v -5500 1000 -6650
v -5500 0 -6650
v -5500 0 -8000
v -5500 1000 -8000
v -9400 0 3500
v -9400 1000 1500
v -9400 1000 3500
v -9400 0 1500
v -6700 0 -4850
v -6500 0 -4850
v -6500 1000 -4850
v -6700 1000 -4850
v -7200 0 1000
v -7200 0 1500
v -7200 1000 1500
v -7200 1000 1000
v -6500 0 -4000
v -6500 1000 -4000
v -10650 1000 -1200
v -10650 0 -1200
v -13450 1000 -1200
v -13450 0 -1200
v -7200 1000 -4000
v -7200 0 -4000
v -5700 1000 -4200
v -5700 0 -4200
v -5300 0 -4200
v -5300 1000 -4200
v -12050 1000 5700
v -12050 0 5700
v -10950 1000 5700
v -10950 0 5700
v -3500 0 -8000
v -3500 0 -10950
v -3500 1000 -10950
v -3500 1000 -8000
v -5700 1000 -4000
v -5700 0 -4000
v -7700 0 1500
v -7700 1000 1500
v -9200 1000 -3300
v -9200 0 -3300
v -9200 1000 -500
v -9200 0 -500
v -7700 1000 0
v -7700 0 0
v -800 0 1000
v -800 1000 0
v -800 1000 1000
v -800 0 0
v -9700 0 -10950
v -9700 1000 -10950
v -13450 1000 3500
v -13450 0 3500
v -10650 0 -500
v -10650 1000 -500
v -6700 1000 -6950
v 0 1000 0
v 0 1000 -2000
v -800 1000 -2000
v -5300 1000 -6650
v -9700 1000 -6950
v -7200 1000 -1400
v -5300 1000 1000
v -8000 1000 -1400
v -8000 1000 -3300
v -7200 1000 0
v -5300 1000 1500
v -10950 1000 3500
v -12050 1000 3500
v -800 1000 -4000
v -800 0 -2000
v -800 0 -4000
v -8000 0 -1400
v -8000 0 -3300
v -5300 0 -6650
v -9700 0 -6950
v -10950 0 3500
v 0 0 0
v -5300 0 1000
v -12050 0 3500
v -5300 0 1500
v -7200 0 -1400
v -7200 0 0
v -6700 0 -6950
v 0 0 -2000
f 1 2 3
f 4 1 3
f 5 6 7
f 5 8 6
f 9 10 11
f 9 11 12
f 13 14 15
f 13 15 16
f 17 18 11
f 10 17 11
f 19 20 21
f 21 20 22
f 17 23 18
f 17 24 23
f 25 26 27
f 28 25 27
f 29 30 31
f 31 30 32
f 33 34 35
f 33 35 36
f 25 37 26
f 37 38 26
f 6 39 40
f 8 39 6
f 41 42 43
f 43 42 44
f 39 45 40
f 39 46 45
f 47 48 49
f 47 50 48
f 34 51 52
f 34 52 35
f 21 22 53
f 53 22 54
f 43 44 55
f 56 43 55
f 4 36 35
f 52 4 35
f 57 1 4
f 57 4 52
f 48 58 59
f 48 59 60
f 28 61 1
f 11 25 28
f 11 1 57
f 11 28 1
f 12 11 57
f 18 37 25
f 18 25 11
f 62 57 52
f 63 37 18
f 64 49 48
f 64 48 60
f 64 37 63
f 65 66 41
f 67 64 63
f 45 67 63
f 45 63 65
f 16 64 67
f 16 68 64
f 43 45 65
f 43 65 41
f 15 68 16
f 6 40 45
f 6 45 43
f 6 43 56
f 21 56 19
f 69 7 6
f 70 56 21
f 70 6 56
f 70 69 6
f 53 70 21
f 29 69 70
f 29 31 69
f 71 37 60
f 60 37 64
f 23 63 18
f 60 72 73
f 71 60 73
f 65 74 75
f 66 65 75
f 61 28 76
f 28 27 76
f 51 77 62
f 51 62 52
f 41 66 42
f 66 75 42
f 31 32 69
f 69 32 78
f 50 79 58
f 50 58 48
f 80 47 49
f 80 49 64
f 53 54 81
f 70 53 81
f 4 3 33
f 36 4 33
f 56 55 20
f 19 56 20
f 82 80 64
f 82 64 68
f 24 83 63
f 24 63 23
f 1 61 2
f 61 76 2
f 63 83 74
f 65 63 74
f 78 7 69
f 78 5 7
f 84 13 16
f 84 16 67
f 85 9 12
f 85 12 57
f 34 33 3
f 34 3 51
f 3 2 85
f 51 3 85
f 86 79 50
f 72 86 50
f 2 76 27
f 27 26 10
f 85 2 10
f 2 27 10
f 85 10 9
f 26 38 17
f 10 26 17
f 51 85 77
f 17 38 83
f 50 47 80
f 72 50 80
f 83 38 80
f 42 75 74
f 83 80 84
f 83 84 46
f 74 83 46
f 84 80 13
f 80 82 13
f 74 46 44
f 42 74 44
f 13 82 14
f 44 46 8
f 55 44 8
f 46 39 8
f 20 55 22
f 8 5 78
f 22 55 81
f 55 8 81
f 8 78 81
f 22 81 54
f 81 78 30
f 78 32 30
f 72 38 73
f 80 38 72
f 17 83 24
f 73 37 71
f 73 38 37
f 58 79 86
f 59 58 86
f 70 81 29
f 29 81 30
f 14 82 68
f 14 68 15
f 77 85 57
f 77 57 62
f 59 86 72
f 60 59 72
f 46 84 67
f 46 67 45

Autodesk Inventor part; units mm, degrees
ref_plane "YZ Plane" through (0, 0, 0) normal (1, 0, 0) x (0, 1, 0)
ref_plane "XZ Plane" through (0, 0, 0) normal (0, 1, 0) x (-1, 0, 0)
ref_plane "XY Plane" through (0, 0, 0) normal (0, 0, 1) x (1, 0, 0)
sketch "Sketch1" plane through (0, 0, 0) normal (0, 1, 0) x (-1, 0, 0)
  line L0 (0, 0) -> (0, -2000)
  line L1 (0, 0) -> (800, 0)
  line L2 (800, 0) -> (800, 1000)
  line L3 (7200, 1000) -> (7200, 0)
  line L4 (7200, 0) -> (7200, -1400) construction
  line L5 (0, -2000) -> (800, -2000)
  line L6 (800, -2000) -> (800, -4000)
  line L7 (800, -4000) -> (7200, -4000) construction
  line L8 (7200, -1400) -> (7200, -4000)
  line L9 (7200, -4000) -> (6500, -4000)
  line L10 (6500, -4000) -> (5700, -4000) construction
  line L11 (5700, -4000) -> (800, -4000)
  line L12 (7200, 0) -> (7700, 0)
  line L13 (7700, 0) -> (7700, 1500)
  line L14 (7700, 1500) -> (9400, 1500)
  line L15 (9400, 1500) -> (9400, 3500)
  line L16 (9400, 3500) -> (10950, 3500)
  line L17 (10950, 3500) -> (12050, 3500) construction
  line L18 (7200, -1400) -> (8000, -1400)
  line L19 (8000, -1400) -> (8000, -3300)
  line L20 (8000, -3300) -> (9200, -3300)
  line L21 (9200, -3300) -> (9200, -500)
  line L22 (9200, -500) -> (10650, -500)
  line L23 (10650, -500) -> (10650, -1200)
  line L24 (10650, -1200) -> (13450, -1200)
  line L25 (13450, -1200) -> (13450, 3500)
  line L26 (13450, 3500) -> (12050, 3500)
  line L27 (12050, 3500) -> (12050, 5700)
  line L28 (12050, 5700) -> (10950, 5700)
  line L29 (10950, 5700) -> (10950, 3500)
  line L30 (6500, -4000) -> (6500, -4850)
  line L31 (6500, -4850) -> (6700, -4850)
  line L32 (6700, -4850) -> (6700, -6950)
  line L33 (6700, -6950) -> (9700, -6950)
  line L34 (9700, -6950) -> (9700, -10950)
  line L35 (5700, -4000) -> (5700, -4200)
  line L36 (5700, -4200) -> (5300, -4200)
  line L37 (5300, -4200) -> (5300, -6650)
  line L38 (5300, -6650) -> (5500, -6650)
  line L39 (5500, -6650) -> (5500, -8000)
  line L40 (5500, -8000) -> (3500, -8000)
  line L41 (9700, -10950) -> (3500, -10950)
  line L42 (3500, -10950) -> (3500, -8000)
  line L43 (800, 1000) -> (5300, 1000)
  line L44 (5300, 1000) -> (5300, 1500)
  line L45 (5300, 1500) -> (7200, 1500)
  line L46 (7200, 1500) -> (7200, 1000)
  dimension "d0" = 2000
  dimension "d1" = 800
  dimension "d2" = 1000
  dimension "d3" = 6400
  dimension "d4" = 1000
  dimension "d5" = 1400
  dimension "d6" = 2000
  dimension "d7" = 700
  dimension "d8" = 800
  dimension "d9" = 500
  dimension "d10" = 1500
  dimension "d11" = 1700
  dimension "d12" = 2000
  dimension "d13" = 1550
  dimension "d14" = 1100
  dimension "d15" = 800
  dimension "d16" = 1900
  dimension "d17" = 1200
  dimension "d18" = 2800
  dimension "d19" = 1450
  dimension "d20" = 700
  dimension "d21" = 2800
  dimension "d22" = 2200
  dimension "d23" = 850
  dimension "d24" = 200
  dimension "d25" = 2100
  dimension "d26" = 3000
  dimension "d27" = 4000
  dimension "d28" = 200
  dimension "d29" = 400
  dimension "d30" = 2450
  dimension "d31" = 200
  dimension "d32" = 1350
  dimension "d33" = 2000
extrude "Extrusion1" add sketch "Sketch1" along normal blind 1000
properties part number "floormap2"
